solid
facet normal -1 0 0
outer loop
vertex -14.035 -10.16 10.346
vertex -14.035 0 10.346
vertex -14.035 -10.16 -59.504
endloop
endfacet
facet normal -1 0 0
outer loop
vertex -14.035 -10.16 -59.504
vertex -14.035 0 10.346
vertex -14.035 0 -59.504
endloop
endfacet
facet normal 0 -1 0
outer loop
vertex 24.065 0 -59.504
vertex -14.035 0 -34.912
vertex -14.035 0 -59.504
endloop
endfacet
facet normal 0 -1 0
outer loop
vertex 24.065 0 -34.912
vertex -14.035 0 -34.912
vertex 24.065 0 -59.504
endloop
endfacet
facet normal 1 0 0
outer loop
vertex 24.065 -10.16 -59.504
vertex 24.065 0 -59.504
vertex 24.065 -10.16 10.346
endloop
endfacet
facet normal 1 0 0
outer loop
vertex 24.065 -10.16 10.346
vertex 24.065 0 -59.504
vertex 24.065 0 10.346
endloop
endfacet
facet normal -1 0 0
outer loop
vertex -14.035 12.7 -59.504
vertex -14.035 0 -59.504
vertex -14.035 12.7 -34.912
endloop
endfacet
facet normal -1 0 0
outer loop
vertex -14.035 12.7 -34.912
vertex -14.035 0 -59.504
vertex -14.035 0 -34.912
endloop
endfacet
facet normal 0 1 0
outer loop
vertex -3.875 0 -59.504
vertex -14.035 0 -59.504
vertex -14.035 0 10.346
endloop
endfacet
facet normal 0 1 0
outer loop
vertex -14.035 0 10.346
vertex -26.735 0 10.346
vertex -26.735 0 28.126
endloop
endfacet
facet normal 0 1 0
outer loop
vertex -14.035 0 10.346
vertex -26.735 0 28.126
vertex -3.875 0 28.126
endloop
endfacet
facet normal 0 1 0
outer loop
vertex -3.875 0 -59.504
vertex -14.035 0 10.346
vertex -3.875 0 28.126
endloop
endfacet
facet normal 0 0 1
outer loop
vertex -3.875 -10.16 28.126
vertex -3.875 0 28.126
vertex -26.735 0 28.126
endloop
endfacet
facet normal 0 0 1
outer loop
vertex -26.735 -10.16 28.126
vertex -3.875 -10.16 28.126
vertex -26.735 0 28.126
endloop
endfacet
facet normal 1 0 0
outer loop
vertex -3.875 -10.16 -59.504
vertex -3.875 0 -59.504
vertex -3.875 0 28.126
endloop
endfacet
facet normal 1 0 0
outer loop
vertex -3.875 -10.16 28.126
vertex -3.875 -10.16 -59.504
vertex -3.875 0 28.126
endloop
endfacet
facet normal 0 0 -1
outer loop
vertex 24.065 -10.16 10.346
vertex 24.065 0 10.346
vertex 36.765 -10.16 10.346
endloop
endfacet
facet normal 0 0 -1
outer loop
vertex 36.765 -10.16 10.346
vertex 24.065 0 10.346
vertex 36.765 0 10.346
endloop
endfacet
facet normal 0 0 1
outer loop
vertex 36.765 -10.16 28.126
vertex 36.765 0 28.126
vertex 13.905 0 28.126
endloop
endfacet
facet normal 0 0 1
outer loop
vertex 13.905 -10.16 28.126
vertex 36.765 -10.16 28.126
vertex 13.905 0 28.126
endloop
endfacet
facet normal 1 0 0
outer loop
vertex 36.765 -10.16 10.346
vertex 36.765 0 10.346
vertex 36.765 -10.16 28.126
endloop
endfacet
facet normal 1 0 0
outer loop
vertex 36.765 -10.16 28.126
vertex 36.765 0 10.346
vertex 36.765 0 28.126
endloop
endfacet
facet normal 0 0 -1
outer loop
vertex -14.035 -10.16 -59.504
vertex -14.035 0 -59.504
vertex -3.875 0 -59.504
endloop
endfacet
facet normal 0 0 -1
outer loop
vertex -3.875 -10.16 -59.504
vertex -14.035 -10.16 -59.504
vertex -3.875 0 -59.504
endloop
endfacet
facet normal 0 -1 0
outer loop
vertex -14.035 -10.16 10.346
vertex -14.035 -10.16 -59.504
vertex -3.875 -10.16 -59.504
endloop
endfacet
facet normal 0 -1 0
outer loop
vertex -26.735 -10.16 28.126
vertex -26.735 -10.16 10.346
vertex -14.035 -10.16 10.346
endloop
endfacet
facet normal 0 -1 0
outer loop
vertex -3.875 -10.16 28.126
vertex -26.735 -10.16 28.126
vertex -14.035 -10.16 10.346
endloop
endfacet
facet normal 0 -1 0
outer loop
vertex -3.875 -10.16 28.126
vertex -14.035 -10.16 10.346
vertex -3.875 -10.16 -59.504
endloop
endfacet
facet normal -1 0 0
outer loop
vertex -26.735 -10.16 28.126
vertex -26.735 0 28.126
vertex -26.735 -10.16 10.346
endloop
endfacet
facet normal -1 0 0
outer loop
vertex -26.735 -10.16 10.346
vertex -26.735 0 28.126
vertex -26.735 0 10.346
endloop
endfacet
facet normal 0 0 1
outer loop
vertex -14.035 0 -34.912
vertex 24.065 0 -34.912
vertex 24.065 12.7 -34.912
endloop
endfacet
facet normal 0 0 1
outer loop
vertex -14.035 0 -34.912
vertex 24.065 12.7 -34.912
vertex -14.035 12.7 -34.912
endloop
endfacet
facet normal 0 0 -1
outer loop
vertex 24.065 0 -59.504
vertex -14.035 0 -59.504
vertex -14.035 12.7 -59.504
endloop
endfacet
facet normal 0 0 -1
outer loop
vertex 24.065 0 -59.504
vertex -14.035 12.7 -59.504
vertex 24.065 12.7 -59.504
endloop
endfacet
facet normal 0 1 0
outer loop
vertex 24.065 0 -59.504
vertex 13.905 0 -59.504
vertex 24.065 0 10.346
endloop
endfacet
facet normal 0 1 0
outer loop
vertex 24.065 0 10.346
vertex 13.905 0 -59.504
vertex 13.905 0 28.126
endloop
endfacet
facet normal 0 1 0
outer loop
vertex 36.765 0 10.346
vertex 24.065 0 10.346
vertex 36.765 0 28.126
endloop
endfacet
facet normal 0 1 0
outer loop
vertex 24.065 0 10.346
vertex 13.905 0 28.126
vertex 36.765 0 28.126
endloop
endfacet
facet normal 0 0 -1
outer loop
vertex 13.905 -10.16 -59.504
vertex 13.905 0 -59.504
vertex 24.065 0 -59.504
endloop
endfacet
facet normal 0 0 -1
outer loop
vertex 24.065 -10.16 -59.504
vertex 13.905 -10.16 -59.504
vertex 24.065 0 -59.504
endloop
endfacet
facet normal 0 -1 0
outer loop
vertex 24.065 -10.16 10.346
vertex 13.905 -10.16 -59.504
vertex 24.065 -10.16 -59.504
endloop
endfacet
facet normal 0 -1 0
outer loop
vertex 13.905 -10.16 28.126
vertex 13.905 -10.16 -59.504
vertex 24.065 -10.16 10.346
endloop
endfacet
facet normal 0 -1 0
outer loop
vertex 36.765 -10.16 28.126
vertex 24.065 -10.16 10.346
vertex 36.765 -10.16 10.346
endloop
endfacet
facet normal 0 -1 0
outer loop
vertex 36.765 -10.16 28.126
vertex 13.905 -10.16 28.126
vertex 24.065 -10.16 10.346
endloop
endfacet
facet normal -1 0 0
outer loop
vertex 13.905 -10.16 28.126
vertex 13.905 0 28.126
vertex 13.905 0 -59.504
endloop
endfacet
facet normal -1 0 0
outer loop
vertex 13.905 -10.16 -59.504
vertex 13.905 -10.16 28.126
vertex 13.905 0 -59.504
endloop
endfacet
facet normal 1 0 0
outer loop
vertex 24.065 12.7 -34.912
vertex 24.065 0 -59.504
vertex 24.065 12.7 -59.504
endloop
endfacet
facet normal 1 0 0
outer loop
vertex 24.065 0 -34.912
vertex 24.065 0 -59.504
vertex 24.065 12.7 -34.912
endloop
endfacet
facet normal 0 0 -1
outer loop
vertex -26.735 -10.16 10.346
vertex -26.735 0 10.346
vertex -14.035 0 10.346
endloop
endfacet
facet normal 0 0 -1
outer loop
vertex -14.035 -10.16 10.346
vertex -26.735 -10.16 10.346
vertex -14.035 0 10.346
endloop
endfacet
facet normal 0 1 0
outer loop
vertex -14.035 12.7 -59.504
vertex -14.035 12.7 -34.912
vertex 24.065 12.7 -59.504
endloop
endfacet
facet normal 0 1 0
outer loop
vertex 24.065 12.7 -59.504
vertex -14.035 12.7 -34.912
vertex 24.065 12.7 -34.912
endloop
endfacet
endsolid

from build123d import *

# Parameters (mm, degrees)
F0_W     = 10.16
F0_H     = 24.5917529829
F0_H_2   = 45.2582470171
F1_DEPTH = 10.16
F0_W_2   = 17.78
F2_DEPTH = 12.7


with BuildPart() as f1:
    # F0 (on Front) → F1 (new body)
    with BuildSketch(Plane.XZ):
        Polygon((-26.7349292358, 28.1259290259), (-26.7349292358, 10.3459290259), (-14.0349292358, 10.3459290259), (-3.8749292358, 10.3459290259), (-3.8749292358, 28.1259290259), align=None)
        with Locations((-8.9549292358, -47.2081944827)):
            Rectangle(F0_W, F0_H)
        with Locations((-8.9549292358, -12.2831944827)):
            Rectangle(F0_W, F0_H_2)
    extrude(amount=F1_DEPTH)


with BuildPart() as f1b:
    # F0 (on Front) → F1, piece 2 (new body)
    with BuildSketch(Plane.XZ):
        with Locations((18.9850707642, -47.2081944827)):
            Rectangle(F0_W, F0_H)
        Polygon((13.9050707642, 28.1259290259), (13.9050707642, 10.3459290259), (24.0650707642, 10.3459290259), (36.7650707642, 10.3459290259), (36.7650707642, 28.1259290259), align=None)
        with Locations((18.9850707642, -12.2831944827)):
            Rectangle(F0_W, F0_H_2)
    extrude(amount=F1_DEPTH)


with BuildPart() as f2:
    # F0 (on Front) → F2 (new body)
    with BuildSketch(Plane.XZ):
        with Locations((-8.9549292358, -47.2081944827)):
            Rectangle(F0_W, F0_H)
        with Locations((5.0150707642, -47.2081944827)):
            Rectangle(F0_W_2, F0_H)
        with Locations((18.9850707642, -47.2081944827)):
            Rectangle(F0_W, F0_H)
    extrude(amount=-F2_DEPTH)


solid = Compound([f1.part, f1b.part, f2.part])
